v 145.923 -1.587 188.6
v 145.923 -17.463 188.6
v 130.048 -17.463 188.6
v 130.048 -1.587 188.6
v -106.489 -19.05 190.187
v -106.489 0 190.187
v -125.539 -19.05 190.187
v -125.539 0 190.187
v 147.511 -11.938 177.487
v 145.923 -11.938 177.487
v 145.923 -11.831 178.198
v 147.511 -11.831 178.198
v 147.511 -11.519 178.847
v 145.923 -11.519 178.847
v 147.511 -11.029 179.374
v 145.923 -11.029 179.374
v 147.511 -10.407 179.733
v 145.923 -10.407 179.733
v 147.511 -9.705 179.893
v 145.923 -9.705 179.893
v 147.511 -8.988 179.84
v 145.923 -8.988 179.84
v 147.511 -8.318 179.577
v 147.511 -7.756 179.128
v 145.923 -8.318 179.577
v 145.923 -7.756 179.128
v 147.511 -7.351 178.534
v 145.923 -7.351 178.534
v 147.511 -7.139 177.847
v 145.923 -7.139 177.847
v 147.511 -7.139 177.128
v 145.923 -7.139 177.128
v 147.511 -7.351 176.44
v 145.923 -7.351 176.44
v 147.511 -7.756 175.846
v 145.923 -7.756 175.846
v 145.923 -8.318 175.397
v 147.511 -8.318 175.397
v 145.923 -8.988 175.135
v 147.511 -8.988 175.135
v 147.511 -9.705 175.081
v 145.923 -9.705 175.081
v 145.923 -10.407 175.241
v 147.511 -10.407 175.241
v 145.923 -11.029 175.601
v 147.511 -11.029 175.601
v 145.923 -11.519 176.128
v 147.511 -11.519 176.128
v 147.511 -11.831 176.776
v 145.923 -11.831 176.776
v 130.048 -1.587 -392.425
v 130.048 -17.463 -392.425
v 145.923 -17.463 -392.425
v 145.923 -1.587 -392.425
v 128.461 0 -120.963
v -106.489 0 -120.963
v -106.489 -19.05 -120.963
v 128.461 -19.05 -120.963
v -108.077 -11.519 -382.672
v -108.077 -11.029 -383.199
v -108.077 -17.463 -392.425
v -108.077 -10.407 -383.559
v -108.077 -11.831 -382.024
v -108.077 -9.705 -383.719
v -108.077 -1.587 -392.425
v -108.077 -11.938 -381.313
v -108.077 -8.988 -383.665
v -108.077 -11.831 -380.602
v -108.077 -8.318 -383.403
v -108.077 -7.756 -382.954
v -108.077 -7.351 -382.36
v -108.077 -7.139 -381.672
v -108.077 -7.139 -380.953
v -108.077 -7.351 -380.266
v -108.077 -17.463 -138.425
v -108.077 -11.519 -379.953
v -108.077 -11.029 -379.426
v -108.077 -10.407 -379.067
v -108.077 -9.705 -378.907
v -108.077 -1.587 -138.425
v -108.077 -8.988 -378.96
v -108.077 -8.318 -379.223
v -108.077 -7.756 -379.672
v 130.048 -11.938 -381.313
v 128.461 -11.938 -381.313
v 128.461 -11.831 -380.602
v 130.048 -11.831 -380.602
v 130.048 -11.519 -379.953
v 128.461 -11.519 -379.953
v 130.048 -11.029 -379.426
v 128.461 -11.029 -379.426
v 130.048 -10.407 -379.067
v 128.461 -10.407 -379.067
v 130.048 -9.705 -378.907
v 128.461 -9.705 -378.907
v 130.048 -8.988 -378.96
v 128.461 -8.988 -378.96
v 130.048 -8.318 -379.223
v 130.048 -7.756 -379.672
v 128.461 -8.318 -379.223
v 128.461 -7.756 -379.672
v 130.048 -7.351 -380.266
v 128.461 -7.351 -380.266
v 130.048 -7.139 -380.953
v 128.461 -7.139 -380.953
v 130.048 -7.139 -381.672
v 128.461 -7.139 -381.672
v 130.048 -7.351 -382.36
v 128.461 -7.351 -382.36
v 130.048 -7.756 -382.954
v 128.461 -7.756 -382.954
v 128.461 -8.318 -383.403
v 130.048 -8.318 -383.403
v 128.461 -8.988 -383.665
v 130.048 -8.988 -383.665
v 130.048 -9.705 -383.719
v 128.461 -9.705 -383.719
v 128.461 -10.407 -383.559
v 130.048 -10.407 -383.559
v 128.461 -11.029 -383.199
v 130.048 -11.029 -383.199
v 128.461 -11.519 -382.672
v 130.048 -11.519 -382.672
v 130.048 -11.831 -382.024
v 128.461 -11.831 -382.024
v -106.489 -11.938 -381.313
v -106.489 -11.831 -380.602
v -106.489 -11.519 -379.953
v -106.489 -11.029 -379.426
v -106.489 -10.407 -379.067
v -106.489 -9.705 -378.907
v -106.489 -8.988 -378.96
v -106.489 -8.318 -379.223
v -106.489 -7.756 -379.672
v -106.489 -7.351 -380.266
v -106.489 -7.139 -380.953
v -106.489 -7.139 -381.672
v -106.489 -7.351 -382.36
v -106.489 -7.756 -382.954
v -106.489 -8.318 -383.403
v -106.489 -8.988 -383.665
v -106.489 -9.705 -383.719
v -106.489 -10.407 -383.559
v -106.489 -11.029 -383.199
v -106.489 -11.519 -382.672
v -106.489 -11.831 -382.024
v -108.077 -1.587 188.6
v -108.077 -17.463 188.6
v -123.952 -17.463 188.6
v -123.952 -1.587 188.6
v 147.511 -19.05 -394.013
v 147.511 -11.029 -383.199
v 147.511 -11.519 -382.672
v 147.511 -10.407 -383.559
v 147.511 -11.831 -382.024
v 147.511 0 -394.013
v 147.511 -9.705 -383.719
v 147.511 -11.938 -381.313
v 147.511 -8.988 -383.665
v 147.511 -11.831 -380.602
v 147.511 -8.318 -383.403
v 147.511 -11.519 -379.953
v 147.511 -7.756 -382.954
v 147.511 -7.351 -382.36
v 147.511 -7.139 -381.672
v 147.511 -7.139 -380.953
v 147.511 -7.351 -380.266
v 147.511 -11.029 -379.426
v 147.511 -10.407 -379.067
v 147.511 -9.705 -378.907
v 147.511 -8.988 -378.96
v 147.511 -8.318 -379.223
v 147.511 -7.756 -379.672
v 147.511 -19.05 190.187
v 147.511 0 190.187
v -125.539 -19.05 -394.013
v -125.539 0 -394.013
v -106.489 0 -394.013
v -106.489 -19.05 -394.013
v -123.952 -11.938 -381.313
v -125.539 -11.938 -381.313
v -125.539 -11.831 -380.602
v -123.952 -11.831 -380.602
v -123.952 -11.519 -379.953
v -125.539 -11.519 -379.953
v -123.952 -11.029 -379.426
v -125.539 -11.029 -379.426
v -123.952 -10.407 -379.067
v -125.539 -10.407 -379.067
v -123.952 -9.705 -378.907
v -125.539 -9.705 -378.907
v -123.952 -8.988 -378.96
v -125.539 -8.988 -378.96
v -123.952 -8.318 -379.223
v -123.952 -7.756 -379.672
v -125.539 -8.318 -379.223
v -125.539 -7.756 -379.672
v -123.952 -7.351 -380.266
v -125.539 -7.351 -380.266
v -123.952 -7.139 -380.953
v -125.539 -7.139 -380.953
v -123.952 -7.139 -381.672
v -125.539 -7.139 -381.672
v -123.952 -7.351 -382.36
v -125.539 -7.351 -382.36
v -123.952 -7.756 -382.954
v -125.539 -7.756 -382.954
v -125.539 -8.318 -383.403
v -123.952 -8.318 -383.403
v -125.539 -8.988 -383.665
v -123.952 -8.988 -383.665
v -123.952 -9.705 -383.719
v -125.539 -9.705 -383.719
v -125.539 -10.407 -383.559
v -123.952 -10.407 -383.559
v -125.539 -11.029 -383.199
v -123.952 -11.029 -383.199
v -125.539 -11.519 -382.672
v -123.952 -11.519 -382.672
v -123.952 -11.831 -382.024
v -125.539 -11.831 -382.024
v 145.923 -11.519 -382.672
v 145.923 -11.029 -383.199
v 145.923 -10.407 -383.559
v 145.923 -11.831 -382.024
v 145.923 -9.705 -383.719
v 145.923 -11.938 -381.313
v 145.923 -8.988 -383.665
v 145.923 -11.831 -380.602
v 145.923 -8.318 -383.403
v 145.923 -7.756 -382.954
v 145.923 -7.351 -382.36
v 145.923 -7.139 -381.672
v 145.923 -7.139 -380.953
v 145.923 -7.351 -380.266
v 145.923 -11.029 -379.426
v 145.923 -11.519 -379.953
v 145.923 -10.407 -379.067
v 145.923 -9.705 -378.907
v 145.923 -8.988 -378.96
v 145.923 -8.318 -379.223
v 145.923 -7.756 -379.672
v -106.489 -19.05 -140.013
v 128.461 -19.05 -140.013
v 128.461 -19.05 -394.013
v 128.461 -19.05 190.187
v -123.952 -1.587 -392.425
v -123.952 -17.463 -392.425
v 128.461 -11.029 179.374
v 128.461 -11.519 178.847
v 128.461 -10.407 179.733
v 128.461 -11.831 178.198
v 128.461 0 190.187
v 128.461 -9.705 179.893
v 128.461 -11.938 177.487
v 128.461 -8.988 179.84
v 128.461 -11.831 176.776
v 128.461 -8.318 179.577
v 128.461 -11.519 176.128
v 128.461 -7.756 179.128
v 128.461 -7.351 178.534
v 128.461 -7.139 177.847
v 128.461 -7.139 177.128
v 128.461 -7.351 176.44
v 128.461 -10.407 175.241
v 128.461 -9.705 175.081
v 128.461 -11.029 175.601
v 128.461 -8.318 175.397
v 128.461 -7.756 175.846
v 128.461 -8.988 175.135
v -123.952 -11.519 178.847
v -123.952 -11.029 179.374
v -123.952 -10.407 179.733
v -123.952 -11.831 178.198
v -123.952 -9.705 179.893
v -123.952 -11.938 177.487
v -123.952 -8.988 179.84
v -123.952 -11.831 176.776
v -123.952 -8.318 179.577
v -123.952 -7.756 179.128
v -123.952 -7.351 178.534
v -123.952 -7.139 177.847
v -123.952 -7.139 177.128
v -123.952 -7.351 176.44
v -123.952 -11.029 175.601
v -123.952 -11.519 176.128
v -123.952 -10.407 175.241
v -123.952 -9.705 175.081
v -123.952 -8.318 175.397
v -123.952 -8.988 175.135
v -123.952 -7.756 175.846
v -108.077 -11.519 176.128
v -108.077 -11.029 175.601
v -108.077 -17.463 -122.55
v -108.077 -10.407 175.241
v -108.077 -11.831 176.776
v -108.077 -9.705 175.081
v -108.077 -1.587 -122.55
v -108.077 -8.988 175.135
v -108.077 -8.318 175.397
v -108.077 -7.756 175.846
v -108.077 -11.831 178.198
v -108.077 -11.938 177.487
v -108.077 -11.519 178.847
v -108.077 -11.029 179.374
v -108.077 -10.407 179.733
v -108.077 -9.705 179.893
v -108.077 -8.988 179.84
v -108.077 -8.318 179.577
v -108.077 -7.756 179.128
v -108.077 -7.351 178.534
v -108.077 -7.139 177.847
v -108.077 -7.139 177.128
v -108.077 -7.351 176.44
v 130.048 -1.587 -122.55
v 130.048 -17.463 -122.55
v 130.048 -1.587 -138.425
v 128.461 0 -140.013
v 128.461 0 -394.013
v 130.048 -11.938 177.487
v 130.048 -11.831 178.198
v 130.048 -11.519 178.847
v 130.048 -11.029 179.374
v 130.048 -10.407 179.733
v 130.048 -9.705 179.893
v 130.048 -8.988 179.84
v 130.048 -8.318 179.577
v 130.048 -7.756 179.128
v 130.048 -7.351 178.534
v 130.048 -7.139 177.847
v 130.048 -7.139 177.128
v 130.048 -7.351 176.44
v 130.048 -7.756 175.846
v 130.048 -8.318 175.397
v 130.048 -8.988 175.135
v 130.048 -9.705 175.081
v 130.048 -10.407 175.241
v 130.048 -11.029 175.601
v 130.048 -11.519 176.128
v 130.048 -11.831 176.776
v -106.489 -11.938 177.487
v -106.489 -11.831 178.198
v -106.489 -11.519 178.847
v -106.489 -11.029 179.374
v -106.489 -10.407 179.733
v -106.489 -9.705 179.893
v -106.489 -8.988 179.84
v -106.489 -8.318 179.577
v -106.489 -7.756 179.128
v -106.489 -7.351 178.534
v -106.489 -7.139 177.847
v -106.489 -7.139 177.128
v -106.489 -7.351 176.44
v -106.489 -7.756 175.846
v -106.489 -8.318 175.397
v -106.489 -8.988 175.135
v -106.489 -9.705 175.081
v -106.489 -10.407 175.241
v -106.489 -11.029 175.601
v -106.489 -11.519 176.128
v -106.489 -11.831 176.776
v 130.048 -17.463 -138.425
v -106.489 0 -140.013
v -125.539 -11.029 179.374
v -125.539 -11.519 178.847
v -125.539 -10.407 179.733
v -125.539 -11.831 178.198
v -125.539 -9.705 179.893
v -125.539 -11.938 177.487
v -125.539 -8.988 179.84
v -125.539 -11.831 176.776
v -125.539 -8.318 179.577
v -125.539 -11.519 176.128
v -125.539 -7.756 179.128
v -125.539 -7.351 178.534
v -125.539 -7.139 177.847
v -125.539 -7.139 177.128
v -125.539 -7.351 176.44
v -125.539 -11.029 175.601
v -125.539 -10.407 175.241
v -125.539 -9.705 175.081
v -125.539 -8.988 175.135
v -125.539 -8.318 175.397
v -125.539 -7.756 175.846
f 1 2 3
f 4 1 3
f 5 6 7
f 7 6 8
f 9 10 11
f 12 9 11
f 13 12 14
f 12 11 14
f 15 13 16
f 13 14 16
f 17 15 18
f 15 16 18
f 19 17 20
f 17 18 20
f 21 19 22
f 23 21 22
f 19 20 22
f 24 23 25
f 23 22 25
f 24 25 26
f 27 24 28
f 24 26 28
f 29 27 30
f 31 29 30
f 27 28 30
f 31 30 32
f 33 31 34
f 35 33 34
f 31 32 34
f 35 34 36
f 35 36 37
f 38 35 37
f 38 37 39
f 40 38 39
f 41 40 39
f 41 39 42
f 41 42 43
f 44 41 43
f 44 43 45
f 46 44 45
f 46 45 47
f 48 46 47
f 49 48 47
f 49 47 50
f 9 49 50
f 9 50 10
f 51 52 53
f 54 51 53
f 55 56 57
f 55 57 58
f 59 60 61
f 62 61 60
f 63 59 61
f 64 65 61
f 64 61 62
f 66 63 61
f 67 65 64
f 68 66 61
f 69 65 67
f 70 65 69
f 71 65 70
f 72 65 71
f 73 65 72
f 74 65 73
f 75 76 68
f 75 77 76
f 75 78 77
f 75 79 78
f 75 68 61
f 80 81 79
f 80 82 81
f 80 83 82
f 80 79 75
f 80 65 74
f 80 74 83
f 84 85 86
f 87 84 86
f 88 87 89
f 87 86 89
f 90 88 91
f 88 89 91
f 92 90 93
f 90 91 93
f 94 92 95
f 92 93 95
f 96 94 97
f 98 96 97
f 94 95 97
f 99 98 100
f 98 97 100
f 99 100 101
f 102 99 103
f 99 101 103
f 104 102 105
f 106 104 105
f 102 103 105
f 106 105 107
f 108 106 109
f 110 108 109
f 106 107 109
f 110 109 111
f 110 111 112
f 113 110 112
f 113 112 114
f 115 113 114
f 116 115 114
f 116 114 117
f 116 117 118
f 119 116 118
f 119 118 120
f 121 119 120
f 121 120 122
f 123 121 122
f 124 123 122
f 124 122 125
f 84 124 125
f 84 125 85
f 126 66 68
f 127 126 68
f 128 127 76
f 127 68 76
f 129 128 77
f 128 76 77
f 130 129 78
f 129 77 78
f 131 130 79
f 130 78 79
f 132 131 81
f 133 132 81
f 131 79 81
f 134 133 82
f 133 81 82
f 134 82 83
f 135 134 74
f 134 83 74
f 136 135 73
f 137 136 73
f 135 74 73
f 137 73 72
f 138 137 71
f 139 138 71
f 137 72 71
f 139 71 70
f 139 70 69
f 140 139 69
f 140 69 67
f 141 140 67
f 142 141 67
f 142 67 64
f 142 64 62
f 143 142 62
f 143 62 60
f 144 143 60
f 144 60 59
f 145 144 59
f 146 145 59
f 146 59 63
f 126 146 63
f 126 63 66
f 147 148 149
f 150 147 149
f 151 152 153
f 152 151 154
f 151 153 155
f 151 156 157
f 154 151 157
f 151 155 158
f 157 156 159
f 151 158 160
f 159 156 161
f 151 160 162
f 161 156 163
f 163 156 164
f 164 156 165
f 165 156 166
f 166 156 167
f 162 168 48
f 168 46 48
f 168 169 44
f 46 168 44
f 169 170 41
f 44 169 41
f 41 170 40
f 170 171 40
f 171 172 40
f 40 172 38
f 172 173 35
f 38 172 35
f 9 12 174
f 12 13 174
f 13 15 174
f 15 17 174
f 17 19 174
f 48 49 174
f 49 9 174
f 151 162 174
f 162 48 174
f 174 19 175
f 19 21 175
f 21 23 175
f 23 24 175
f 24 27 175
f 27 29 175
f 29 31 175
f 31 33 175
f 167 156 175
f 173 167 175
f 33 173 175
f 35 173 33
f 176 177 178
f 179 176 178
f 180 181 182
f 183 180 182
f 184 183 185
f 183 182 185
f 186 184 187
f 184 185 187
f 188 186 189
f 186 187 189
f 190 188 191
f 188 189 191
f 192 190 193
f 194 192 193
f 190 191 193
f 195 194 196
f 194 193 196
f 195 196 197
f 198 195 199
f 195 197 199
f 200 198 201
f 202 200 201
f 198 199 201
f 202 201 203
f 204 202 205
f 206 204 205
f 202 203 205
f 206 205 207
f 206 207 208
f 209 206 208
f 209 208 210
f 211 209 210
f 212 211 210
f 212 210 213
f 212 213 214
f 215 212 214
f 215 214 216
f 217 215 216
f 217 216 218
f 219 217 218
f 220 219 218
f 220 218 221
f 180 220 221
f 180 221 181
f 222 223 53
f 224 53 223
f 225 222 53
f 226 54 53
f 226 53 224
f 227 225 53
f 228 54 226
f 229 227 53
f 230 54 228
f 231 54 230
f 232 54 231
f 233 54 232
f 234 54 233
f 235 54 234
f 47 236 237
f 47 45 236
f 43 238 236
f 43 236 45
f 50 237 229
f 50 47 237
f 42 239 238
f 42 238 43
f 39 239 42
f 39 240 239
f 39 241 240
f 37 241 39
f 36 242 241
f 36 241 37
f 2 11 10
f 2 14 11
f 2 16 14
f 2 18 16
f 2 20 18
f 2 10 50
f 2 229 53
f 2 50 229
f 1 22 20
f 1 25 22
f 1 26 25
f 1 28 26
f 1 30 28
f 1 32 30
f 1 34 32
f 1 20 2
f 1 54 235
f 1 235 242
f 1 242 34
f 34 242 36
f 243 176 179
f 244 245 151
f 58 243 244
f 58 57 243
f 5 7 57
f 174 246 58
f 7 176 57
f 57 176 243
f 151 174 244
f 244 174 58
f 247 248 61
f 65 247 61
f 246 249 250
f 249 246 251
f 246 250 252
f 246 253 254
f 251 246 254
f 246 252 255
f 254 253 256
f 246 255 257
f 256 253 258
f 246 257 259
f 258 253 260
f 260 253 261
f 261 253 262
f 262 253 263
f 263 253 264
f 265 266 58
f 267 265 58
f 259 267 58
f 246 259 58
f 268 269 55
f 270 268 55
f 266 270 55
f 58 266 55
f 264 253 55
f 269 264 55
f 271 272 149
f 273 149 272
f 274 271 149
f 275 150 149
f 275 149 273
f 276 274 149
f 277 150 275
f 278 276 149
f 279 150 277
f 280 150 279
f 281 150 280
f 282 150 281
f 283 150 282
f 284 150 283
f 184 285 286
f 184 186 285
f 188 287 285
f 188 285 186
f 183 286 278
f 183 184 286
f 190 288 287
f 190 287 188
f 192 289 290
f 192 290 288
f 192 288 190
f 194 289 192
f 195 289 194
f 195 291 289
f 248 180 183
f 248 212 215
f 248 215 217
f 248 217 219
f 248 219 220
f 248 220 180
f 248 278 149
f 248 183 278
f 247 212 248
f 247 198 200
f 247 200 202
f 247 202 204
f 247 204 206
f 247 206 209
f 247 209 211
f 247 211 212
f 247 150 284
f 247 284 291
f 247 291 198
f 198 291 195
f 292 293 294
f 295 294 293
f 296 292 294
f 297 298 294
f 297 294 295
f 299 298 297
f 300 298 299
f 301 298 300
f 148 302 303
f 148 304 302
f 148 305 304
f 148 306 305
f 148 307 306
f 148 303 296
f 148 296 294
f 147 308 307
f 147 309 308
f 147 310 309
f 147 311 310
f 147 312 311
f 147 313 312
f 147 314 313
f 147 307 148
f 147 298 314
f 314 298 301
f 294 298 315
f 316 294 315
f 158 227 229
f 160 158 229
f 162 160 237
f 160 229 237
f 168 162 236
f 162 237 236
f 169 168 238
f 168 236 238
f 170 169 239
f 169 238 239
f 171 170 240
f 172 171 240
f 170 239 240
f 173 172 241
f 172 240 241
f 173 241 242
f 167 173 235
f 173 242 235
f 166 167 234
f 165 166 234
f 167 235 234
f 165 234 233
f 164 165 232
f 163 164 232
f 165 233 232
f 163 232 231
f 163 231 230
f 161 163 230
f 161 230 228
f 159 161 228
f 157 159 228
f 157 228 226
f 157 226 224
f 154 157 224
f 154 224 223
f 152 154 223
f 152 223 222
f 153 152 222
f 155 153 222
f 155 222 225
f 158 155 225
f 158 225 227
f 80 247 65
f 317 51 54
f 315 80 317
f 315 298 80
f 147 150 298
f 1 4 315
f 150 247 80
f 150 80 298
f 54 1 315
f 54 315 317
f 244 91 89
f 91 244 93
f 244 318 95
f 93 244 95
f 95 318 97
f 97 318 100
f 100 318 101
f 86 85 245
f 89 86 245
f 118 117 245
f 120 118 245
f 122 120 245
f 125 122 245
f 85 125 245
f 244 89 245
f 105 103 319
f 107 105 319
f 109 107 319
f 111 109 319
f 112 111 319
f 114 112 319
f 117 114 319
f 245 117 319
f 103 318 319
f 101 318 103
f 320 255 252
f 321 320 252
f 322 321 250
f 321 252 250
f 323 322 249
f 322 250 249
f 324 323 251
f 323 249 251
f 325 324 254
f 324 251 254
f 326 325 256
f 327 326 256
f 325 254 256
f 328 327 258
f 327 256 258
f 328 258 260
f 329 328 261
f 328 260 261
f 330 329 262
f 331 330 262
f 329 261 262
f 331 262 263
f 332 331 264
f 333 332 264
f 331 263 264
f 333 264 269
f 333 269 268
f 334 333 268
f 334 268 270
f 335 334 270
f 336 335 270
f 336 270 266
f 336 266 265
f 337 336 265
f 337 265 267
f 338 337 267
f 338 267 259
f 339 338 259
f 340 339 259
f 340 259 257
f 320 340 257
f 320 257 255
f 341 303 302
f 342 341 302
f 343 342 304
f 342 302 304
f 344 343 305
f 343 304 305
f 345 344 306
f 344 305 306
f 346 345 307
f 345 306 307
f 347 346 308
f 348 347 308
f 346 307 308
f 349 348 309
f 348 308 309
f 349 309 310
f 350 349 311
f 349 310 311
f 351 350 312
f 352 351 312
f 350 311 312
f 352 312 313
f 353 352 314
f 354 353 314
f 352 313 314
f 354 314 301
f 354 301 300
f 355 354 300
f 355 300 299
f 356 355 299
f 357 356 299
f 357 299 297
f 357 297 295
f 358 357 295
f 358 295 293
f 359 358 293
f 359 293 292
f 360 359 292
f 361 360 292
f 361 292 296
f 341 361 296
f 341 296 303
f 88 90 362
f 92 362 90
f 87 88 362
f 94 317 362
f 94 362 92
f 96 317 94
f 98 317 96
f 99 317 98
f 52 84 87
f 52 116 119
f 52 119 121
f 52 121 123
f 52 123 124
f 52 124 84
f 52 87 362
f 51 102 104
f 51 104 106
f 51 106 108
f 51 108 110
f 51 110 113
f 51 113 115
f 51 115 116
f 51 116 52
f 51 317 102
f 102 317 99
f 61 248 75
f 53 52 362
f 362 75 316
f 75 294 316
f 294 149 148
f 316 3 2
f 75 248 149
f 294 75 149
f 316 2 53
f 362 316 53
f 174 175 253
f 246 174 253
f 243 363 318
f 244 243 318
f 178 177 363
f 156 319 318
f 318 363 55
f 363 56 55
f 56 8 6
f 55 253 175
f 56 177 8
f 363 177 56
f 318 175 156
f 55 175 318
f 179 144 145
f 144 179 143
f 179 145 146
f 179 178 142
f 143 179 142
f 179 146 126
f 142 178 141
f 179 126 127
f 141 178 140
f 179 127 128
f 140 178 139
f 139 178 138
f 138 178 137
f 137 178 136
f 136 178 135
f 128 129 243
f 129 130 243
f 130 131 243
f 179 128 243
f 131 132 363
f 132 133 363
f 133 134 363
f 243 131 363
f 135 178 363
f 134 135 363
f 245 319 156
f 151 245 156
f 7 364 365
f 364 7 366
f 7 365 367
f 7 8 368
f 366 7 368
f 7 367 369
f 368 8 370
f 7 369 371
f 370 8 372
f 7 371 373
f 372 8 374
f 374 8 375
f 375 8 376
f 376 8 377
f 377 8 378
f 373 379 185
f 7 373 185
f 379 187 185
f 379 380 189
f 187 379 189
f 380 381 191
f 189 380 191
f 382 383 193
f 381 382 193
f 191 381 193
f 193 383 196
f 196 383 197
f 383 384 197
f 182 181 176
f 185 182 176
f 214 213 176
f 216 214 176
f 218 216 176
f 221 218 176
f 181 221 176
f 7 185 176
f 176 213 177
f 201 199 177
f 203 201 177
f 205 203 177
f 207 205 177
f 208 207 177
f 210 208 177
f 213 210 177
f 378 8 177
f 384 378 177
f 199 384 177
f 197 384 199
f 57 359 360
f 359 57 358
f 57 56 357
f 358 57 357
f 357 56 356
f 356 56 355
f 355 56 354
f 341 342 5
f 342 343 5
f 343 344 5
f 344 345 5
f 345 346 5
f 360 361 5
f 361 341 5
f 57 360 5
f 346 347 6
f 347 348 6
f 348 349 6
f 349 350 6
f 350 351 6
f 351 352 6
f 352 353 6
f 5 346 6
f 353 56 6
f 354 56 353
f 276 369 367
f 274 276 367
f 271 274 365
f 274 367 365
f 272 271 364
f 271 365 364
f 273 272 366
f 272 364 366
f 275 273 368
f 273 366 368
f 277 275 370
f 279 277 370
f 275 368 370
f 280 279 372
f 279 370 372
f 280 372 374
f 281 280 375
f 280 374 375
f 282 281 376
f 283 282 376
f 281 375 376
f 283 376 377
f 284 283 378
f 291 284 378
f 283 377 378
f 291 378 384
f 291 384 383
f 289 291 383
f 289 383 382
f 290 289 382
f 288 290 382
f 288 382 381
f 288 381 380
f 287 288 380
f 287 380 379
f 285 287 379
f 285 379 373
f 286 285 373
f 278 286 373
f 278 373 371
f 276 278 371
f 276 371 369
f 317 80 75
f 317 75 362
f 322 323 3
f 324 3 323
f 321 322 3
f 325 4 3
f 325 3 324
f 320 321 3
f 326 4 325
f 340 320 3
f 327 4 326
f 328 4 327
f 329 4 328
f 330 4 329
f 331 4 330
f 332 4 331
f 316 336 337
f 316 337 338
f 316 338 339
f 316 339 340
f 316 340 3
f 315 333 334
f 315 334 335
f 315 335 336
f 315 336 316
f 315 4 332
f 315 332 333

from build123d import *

# Parameters (mm, degrees)
F0_W     = 234.95
F0_H     = 19.05
F1_DEPTH = 19.05
F2_T     = -1.5875
F4_D     = 4.826
F6_D     = 4.826


with BuildPart() as f1:
    # F0 (on Front) → F1 (new body)
    with BuildSketch(Plane.XZ):
        Polygon((-106.4893787249, 190.1872142076), (-125.5393787249, 190.1872142076), (-125.5393787249, -394.0127857924), (-106.4893787249, -394.0127857924), (-106.4893787249, -140.0127857924), (-106.4893787249, -120.9627857924), align=None)
        with Locations((10.9856212751, -130.4877857924)):
            Rectangle(F0_W, F0_H)
        Polygon((128.4606212751, 190.1872142076), (128.4606212751, -120.9627857924), (128.4606212751, -140.0127857924), (128.4606212751, -394.0127857924), (147.5106212751, -394.0127857924), (147.5106212751, 190.1872142076), align=None)
    extrude(amount=F1_DEPTH)

    # F2 (hollow: no face is removed)
    offset(amount=F2_T, kind=Kind.INTERSECTION, mode=Mode.SUBTRACT)

    # F4 (through all)
    with Locations(Plane.YZ.offset(147.5106212751)):
        with Locations((-9.525, -381.3127857924)):
            Hole(F4_D / 2)

    # F6 (through all)
    with Locations(Plane.YZ.offset(147.5106212751)):
        with Locations((-9.525, 177.4872142076)):
            Hole(F6_D / 2)


solid = f1.part
